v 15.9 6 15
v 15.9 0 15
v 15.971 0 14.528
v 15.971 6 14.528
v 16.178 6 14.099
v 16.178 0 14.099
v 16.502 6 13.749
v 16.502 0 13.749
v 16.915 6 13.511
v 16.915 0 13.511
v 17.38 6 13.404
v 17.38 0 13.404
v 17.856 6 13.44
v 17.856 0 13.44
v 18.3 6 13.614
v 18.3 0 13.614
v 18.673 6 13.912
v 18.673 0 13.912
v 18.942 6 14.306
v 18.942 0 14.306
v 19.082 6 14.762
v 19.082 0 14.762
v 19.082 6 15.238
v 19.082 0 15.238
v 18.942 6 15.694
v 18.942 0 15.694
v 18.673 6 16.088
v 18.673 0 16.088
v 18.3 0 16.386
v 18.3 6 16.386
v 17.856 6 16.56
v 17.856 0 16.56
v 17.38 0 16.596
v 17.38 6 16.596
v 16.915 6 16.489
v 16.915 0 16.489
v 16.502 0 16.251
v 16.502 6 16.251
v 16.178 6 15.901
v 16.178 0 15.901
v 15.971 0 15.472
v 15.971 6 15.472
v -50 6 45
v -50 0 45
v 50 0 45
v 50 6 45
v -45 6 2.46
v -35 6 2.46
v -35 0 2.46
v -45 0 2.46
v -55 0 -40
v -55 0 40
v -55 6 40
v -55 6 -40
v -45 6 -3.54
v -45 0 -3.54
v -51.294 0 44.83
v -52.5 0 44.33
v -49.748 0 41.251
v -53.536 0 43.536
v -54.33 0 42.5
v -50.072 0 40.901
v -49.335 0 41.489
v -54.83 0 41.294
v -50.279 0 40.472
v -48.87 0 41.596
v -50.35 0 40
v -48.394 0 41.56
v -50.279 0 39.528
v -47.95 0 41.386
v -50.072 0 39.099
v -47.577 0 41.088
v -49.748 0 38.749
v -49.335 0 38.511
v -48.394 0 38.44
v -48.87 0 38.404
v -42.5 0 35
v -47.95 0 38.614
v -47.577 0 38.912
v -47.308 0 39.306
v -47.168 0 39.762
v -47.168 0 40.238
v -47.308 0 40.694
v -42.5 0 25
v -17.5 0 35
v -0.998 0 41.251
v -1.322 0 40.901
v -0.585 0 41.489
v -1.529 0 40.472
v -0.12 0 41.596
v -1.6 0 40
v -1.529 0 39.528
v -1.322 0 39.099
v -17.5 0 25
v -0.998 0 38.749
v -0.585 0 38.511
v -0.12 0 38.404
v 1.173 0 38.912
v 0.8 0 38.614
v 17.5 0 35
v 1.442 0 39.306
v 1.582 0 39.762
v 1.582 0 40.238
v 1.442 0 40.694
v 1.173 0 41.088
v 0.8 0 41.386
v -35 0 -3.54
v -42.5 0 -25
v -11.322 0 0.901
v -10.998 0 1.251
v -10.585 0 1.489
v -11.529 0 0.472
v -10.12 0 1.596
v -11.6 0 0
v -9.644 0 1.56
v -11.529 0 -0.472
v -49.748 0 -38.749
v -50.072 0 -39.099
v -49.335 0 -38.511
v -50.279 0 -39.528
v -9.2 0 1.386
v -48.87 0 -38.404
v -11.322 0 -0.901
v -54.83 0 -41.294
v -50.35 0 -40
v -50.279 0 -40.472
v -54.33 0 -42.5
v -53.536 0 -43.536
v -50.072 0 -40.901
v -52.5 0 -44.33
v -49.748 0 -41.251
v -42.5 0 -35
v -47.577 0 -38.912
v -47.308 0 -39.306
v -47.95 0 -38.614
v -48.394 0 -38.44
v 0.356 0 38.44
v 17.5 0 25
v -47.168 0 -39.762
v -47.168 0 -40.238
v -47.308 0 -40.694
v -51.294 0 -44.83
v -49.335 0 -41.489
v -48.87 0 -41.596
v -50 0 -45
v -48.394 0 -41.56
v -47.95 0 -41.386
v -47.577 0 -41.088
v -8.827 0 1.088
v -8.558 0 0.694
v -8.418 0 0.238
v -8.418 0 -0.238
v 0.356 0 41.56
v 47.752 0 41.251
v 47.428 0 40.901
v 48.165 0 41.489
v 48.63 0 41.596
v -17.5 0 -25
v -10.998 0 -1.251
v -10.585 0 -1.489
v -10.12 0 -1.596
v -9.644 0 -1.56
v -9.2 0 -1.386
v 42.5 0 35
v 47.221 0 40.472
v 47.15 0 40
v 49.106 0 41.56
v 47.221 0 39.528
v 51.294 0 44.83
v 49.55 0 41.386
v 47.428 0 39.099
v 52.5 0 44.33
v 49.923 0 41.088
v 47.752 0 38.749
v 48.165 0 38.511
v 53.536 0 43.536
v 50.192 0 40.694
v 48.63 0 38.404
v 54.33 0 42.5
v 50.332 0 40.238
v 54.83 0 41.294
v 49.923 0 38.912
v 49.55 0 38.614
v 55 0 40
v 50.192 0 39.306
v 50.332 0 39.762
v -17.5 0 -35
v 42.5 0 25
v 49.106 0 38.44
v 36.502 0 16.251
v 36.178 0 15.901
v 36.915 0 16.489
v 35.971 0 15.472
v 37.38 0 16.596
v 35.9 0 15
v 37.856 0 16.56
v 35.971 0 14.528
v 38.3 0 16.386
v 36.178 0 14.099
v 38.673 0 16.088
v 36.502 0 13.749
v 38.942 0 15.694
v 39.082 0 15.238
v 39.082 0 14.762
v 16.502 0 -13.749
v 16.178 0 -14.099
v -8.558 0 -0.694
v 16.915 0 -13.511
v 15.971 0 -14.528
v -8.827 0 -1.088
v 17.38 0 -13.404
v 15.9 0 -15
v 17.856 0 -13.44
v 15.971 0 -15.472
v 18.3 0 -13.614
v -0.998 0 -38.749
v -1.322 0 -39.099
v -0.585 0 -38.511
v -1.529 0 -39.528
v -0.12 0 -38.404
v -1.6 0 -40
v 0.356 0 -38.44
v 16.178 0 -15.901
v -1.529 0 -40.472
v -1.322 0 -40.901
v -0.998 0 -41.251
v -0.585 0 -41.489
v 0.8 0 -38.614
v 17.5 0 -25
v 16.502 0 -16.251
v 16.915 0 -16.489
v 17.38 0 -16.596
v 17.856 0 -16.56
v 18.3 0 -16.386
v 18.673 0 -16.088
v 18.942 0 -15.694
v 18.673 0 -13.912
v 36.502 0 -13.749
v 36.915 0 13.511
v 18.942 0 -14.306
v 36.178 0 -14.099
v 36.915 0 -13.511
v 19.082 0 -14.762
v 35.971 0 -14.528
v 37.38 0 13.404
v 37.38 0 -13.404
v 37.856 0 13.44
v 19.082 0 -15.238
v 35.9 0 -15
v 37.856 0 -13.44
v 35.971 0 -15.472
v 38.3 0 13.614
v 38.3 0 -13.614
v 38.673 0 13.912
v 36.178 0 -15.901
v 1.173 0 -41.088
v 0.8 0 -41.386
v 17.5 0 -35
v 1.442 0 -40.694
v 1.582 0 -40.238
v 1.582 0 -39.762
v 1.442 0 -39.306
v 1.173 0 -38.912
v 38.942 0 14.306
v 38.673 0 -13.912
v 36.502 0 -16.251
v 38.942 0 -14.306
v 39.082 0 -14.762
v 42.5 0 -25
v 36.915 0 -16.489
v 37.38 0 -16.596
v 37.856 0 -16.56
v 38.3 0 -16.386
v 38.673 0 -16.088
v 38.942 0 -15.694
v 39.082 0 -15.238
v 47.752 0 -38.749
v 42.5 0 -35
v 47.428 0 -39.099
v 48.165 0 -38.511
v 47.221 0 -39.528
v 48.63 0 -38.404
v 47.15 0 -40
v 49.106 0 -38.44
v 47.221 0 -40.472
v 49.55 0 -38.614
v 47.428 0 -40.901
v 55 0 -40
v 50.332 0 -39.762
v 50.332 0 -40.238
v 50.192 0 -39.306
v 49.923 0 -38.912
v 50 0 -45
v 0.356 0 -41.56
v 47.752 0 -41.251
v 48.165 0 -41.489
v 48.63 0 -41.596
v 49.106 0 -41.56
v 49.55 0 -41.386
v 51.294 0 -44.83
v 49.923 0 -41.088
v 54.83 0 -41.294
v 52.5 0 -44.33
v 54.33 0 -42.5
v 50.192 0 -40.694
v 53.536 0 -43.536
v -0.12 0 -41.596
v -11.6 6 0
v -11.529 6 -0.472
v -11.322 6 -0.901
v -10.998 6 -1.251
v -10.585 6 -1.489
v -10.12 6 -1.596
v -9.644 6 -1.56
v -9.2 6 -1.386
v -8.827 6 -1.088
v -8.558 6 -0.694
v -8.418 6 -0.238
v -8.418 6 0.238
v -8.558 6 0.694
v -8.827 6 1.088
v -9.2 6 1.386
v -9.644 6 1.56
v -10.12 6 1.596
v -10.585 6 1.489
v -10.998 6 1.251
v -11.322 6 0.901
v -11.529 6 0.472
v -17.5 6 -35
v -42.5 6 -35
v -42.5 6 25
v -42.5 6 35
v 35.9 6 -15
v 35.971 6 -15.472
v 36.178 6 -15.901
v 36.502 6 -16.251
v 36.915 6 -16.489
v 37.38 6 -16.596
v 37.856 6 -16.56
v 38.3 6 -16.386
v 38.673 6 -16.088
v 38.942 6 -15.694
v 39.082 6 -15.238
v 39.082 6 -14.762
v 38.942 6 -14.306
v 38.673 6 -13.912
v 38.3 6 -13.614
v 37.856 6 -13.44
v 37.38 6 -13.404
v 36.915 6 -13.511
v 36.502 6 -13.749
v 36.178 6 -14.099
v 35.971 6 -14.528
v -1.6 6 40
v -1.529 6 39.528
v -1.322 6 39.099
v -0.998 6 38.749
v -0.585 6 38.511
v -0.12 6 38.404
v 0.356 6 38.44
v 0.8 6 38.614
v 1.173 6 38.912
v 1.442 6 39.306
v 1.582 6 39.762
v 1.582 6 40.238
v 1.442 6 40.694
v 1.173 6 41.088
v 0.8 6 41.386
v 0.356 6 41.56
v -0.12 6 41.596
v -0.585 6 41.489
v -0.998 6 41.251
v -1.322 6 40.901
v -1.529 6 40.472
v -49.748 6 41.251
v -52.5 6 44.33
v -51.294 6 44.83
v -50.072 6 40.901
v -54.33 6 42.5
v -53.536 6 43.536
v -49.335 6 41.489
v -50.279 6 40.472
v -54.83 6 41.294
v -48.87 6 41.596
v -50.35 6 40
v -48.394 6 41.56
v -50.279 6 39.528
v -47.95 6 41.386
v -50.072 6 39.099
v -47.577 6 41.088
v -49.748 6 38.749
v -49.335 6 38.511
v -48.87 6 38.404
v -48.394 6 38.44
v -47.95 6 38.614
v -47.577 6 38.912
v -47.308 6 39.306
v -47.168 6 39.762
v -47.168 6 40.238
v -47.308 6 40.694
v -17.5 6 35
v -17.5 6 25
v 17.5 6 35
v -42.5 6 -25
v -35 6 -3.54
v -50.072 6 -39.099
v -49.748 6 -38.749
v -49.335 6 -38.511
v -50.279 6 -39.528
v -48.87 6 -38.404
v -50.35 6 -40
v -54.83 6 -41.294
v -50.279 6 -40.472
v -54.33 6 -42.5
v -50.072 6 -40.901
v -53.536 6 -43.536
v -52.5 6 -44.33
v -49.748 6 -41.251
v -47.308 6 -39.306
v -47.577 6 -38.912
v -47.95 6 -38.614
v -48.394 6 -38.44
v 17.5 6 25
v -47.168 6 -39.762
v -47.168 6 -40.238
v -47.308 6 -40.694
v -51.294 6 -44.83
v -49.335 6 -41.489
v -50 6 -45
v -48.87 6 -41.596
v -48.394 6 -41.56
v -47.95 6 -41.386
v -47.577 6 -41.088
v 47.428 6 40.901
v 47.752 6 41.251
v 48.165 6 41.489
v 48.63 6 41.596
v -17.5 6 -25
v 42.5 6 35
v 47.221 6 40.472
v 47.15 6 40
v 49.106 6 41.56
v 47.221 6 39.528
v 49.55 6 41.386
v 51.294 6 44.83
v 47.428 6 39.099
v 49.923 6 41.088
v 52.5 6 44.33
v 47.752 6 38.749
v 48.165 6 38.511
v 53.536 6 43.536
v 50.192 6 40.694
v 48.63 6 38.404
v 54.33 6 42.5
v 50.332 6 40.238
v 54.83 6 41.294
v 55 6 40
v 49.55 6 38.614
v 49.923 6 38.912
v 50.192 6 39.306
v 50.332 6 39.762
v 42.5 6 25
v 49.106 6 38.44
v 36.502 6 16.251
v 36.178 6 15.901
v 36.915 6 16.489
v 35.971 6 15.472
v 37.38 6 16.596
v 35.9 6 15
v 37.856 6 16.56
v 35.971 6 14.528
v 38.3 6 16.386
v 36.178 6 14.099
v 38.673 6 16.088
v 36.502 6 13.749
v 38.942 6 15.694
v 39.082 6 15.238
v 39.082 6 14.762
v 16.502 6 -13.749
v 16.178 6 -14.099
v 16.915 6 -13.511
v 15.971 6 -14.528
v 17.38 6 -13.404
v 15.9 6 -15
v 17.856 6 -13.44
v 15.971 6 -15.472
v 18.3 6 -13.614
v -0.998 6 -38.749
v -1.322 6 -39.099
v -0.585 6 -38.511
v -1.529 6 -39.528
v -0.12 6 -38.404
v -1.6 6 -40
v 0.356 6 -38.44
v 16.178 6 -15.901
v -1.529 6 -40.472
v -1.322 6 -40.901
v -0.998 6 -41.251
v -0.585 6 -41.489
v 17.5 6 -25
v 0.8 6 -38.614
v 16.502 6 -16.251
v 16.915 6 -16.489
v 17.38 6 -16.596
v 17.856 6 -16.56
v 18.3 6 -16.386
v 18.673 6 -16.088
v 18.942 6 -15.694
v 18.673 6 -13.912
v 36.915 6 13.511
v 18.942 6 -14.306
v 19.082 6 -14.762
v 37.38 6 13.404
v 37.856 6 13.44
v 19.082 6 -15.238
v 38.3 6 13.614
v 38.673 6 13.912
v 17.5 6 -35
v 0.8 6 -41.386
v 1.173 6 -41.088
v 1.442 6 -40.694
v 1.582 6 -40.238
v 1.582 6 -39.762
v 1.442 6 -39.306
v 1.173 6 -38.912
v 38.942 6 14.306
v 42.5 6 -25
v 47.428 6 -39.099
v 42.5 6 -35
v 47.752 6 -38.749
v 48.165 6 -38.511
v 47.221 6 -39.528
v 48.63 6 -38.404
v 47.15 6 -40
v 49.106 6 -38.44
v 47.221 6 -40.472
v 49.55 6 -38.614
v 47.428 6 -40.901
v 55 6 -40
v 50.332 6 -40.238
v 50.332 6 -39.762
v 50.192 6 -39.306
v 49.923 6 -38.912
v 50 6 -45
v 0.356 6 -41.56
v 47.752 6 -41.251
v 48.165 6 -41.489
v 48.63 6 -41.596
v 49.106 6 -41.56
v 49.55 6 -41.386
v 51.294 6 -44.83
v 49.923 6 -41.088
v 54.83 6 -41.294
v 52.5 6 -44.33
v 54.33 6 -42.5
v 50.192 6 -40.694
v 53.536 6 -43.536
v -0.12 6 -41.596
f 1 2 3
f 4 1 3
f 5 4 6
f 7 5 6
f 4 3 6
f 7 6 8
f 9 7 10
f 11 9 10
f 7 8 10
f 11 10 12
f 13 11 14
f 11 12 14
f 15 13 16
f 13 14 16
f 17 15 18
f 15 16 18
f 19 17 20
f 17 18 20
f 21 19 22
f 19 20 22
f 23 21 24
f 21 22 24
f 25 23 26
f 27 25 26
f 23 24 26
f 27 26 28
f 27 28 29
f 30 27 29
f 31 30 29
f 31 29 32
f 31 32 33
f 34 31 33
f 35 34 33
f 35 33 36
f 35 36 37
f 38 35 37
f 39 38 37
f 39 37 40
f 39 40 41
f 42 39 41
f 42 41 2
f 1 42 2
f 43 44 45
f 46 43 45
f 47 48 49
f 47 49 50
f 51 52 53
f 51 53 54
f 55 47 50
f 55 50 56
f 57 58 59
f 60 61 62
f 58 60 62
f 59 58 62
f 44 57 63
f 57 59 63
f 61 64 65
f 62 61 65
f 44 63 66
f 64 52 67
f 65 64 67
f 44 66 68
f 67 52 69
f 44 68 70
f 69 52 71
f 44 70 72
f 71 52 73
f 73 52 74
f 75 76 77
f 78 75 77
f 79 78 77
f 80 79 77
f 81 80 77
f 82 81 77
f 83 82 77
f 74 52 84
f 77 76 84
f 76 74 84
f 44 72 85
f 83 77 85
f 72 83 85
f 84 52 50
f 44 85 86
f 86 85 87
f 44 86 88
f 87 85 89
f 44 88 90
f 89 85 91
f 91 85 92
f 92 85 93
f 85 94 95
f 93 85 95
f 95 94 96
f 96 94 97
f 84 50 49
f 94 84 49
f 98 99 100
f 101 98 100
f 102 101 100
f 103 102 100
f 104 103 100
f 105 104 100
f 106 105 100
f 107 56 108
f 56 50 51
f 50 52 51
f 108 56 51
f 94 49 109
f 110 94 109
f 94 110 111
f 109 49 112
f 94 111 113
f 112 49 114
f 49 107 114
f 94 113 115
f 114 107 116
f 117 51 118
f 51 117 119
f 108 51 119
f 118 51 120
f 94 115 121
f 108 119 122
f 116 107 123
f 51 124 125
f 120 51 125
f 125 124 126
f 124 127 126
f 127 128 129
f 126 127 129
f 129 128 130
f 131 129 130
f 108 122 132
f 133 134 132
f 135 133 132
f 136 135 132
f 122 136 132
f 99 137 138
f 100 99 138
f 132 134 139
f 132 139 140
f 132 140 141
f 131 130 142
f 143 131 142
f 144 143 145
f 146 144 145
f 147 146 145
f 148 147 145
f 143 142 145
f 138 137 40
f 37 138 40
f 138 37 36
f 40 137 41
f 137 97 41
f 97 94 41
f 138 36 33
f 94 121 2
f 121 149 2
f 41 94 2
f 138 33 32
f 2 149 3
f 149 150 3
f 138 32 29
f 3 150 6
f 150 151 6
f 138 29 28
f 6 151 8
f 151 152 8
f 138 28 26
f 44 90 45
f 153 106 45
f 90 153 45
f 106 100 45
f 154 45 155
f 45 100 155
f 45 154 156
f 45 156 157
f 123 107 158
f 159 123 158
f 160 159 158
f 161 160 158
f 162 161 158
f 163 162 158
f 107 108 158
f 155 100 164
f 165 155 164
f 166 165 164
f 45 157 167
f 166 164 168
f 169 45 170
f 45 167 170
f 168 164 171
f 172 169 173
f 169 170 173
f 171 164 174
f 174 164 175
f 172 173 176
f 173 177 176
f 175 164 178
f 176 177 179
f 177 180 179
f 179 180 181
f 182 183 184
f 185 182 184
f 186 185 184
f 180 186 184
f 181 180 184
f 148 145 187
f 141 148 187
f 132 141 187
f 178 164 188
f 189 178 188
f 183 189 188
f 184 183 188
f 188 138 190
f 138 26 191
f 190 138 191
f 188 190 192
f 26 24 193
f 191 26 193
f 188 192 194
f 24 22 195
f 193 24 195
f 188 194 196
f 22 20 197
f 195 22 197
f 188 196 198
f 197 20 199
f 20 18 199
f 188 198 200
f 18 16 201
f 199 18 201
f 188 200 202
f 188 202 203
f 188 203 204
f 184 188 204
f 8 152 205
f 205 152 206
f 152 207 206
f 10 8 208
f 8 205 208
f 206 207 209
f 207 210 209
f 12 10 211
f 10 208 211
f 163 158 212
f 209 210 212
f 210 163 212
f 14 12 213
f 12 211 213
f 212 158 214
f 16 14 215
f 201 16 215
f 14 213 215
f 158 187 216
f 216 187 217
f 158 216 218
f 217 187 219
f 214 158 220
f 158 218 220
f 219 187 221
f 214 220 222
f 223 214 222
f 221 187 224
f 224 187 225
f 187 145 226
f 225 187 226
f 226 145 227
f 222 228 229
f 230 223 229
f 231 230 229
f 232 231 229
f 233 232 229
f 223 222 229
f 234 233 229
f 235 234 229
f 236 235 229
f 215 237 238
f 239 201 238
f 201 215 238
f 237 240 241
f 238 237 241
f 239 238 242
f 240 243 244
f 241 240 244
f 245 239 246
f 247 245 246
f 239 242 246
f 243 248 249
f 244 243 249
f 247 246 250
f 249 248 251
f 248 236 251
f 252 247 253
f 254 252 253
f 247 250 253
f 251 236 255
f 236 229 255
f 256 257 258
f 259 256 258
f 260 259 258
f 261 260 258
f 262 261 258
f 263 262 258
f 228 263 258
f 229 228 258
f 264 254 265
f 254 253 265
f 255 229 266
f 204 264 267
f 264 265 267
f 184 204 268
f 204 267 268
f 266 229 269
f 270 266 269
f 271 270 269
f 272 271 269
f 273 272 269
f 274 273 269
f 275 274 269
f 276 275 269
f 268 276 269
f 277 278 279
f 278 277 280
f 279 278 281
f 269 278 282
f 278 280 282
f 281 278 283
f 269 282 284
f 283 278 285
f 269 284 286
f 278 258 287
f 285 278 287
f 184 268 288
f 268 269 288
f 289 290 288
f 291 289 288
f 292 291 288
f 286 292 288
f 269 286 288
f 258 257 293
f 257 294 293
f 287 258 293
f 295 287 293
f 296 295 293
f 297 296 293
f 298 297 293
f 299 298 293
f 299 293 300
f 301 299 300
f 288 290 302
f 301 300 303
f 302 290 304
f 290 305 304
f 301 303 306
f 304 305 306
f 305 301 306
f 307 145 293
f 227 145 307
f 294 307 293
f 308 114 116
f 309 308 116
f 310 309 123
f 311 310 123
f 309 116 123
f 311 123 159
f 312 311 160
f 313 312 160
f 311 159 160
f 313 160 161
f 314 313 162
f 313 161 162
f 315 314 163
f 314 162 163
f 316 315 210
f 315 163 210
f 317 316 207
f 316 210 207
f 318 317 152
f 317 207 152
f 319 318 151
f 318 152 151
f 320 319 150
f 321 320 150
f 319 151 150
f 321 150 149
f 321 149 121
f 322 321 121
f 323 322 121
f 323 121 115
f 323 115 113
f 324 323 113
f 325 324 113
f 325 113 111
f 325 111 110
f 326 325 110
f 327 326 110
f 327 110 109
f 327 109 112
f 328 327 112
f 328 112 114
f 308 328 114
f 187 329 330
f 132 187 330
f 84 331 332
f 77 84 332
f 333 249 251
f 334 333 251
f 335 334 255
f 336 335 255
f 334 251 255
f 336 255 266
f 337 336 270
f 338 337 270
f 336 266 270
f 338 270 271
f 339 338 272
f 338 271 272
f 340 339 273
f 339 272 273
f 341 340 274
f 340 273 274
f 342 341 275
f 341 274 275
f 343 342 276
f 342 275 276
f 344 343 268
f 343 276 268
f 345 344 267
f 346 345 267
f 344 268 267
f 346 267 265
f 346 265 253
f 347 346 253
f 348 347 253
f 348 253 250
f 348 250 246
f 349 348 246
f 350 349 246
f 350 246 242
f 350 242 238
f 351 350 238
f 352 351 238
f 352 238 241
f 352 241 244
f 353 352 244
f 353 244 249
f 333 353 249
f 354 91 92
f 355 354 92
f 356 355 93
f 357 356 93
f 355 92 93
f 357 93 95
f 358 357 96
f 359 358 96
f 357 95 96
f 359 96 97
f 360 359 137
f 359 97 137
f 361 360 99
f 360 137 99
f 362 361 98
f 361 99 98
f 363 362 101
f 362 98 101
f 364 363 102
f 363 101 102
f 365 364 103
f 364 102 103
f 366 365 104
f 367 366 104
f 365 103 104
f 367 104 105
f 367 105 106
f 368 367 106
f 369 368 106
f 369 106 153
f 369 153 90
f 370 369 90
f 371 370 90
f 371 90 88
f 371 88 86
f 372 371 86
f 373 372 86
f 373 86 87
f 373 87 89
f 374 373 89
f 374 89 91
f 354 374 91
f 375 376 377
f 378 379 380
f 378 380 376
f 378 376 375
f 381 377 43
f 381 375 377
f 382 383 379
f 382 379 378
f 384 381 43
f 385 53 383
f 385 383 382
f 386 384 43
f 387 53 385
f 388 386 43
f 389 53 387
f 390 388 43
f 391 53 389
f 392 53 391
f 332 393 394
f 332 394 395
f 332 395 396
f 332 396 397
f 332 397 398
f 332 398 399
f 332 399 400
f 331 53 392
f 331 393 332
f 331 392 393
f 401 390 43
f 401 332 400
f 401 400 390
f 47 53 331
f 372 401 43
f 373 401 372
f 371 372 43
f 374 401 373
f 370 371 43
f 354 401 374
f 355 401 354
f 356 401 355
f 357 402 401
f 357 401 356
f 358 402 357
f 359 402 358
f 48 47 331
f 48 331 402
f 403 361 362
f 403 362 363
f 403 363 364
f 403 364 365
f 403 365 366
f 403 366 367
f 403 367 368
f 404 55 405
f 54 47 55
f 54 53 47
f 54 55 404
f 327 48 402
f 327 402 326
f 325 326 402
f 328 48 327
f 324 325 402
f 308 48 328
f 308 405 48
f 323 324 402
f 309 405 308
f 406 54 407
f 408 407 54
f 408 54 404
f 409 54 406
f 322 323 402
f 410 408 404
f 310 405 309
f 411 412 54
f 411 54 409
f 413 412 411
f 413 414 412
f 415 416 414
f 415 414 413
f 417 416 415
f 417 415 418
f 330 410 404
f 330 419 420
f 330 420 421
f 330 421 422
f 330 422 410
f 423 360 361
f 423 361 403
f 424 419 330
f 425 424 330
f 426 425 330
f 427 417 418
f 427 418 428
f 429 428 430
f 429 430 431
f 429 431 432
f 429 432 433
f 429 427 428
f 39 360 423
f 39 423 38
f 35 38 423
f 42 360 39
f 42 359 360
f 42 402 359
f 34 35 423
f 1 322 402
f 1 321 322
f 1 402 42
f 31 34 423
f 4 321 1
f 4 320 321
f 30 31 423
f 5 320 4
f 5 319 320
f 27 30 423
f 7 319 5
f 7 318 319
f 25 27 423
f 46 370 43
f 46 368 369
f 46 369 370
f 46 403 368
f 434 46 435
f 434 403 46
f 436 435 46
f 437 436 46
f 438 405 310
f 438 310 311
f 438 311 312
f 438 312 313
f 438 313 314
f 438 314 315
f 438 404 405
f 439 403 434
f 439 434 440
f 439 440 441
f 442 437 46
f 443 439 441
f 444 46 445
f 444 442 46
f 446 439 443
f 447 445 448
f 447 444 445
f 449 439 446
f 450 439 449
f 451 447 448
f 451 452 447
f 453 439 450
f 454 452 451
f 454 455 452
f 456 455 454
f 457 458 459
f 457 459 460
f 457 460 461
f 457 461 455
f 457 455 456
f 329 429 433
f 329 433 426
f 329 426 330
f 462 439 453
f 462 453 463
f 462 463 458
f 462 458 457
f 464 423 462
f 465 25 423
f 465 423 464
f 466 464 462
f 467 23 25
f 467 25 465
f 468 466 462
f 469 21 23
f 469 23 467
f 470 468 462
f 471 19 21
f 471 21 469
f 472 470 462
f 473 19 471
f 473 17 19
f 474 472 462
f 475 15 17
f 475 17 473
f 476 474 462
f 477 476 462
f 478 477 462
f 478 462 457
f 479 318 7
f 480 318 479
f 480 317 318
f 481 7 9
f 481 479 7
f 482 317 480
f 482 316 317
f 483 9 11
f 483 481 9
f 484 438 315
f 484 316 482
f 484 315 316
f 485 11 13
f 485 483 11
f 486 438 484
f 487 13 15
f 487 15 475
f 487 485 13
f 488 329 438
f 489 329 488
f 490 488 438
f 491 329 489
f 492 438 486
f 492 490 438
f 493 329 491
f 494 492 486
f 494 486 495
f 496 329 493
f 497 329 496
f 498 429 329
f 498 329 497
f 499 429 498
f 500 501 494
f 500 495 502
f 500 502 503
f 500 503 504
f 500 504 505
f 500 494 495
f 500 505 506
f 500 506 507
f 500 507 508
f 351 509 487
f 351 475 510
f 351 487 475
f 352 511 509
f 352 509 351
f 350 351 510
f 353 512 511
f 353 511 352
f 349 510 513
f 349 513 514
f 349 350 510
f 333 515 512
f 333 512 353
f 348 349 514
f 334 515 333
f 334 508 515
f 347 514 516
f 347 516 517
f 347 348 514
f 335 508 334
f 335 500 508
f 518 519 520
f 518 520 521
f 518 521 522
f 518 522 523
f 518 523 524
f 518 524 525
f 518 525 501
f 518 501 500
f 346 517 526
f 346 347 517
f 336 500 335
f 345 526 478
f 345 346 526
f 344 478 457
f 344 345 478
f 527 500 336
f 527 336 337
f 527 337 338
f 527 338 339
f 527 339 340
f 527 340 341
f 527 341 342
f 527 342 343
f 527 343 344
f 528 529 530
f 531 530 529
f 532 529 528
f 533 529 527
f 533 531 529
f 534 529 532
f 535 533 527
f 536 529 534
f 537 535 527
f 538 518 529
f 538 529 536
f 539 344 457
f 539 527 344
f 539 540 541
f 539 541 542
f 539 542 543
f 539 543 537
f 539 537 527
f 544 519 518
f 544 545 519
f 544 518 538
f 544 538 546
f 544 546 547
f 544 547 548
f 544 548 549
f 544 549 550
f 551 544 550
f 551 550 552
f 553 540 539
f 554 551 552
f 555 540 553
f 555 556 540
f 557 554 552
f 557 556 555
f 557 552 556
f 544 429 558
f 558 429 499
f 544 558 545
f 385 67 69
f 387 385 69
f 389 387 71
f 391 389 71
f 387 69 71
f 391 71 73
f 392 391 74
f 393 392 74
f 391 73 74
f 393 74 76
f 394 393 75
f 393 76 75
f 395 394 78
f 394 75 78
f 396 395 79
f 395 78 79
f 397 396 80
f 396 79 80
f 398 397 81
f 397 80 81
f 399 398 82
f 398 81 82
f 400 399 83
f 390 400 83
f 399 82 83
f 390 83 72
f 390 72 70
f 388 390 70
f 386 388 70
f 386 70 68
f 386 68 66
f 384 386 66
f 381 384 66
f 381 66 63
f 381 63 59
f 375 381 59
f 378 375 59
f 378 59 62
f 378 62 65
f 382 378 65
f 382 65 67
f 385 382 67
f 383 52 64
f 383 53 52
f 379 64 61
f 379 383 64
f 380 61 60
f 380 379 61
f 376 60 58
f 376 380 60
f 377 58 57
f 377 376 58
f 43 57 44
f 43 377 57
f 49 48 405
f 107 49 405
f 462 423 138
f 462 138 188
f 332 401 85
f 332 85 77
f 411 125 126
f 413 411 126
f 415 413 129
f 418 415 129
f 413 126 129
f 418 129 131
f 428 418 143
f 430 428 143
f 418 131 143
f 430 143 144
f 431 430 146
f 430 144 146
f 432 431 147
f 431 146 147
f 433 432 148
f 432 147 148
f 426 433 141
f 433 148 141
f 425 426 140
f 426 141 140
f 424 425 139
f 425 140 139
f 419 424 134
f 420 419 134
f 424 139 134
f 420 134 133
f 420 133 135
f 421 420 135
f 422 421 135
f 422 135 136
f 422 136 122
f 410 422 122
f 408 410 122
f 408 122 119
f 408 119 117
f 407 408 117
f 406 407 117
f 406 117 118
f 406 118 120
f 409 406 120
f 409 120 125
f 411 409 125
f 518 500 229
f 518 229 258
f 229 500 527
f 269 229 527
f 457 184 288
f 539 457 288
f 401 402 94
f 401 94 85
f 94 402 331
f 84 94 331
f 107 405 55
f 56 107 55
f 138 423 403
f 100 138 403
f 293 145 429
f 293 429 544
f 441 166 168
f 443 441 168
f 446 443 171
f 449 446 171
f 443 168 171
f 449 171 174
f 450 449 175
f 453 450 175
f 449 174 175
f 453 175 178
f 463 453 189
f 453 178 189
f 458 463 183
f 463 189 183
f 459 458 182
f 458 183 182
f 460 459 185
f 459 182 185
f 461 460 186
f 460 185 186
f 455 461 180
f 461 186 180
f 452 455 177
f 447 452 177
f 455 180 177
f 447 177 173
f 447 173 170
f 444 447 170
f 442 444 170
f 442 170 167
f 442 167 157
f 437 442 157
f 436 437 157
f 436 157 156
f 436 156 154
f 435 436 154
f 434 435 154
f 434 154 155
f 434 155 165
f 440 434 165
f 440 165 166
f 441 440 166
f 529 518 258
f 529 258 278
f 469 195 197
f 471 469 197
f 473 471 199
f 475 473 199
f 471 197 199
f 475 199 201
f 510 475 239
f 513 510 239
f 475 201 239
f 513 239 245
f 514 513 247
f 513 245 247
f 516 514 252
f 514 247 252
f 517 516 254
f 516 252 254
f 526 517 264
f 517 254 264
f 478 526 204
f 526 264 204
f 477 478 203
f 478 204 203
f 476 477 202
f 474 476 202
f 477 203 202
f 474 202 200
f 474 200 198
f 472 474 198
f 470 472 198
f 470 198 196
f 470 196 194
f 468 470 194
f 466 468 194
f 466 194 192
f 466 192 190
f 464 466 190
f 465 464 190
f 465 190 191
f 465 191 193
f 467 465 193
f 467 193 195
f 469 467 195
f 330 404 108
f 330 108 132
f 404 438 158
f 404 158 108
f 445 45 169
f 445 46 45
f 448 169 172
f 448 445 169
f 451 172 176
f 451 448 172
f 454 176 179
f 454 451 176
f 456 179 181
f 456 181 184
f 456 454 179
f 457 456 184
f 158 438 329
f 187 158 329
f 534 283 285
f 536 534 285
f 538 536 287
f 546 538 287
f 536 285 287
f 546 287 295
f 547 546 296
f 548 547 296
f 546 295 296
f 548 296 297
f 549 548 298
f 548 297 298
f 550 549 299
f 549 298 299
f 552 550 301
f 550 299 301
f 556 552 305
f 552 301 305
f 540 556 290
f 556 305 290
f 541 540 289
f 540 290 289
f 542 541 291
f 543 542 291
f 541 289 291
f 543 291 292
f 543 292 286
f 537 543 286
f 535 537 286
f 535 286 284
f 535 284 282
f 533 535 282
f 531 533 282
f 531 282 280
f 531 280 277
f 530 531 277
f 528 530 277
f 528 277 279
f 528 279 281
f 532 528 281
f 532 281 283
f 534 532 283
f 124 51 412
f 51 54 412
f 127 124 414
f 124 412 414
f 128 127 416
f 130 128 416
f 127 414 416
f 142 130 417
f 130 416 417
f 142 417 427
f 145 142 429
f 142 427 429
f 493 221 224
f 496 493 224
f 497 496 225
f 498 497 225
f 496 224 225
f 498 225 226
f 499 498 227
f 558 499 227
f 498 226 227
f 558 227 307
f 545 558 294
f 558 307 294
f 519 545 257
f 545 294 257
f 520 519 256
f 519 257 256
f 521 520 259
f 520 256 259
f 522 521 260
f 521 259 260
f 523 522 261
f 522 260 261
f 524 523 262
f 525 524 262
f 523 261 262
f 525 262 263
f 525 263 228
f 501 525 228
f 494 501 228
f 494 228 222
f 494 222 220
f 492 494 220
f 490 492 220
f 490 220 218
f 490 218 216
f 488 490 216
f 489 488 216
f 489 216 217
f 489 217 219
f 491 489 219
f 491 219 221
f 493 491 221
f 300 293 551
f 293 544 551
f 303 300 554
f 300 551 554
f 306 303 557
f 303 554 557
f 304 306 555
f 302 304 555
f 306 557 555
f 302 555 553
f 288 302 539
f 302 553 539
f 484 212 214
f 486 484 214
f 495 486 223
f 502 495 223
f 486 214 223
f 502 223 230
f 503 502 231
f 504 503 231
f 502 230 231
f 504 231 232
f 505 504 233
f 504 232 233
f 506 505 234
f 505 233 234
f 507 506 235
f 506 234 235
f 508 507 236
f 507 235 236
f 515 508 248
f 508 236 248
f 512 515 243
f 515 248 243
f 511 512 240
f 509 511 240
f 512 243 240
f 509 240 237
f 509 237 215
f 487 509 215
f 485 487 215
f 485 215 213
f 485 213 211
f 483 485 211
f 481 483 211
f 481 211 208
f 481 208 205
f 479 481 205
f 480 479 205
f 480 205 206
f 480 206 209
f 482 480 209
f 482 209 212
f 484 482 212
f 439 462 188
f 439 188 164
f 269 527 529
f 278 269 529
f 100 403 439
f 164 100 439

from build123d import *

# Parameters (mm, degrees)
SKETCH1_W                = 110
SKETCH1_H                = 90
BOSS_EXTRUDE1_DEPTH      = 6
SKETCH2_W                = 25
SKETCH2_H                = 10
CUT_EXTRUDE1_DEPTH       = 7
MIRROR2_COPY_1_SKETCH_W  = 25
MIRROR2_COPY_1_SKETCH_H  = 10
MIRROR2_COPY_1_DEPTH     = 7
M3_CLEARANCE_HOLE1_D     = 3.2
M3_CLEARANCE_HOLE2_D     = 3.2
FILLET1_R                = 5
SKETCH62_W               = 10
SKETCH62_H               = 6
CUT_EXTRUDE12_DEPTH      = 4
CUT_EXTRUDE12_DEPTH_BACK = 4


with BuildPart() as part:
    # Sketch1 → Boss-Extrude1 (new body)
    with BuildSketch(Plane(origin=(0, 0, 0), x_dir=(1, 0, 0), z_dir=(0, 1, 0))):
        Rectangle(SKETCH1_W, SKETCH1_H)
    extrude(amount=BOSS_EXTRUDE1_DEPTH)

    # Sketch2 → Cut-Extrude1 (cut, through all)
    with BuildSketch(Plane(origin=(0, 6, 0), x_dir=(1, 0, 0), z_dir=(0, 1, 0))):
        with Locations((30, 30)):
            Rectangle(SKETCH2_W, SKETCH2_H)
    cut_extrude1 = extrude(amount=-CUT_EXTRUDE1_DEPTH, mode=Mode.SUBTRACT)

    # Mirror1: Cut-Extrude1 across plane
    add(cut_extrude1.mirror(Plane.XY), mode=Mode.SUBTRACT)

    # Mirror2: Cut-Extrude1 across plane
    add(cut_extrude1.mirror(Plane(origin=(0, 0, 0), x_dir=(0, 0, 1), z_dir=(1, 0, 0))), mode=Mode.SUBTRACT)

    # Mirror2 copy 1 sketch → Mirror2 copy 1 (cut, through all)
    with BuildSketch(Plane(origin=(0, 6, 0), x_dir=(-1, 0, 0), z_dir=(0, 1, 0))):
        with Locations((30, 30)):
            Rectangle(MIRROR2_COPY_1_SKETCH_W, MIRROR2_COPY_1_SKETCH_H)
    extrude(amount=-MIRROR2_COPY_1_DEPTH, mode=Mode.SUBTRACT)

    # M3 Clearance Hole1 (through all)
    with Locations(Plane(origin=(0, 6, 0), x_dir=(1, 0, 0), z_dir=(0, 1, 0))):
        with Locations((17.5, 15), (37.5, 15), (17.5, -15), (37.5, -15)):
            Hole(M3_CLEARANCE_HOLE1_D / 2)

    # M3 Clearance Hole2 (through all)
    with Locations(Plane(origin=(0, 6, 0), x_dir=(1, 0, 0), z_dir=(0, 1, 0))):
        with Locations((48.75, 40), (0, 40), (-48.75, 40), (-48.75, -40), (0, -40), (48.75, -40), (-10, 0)):
            Hole(M3_CLEARANCE_HOLE2_D / 2)

    # Fillet1
    fillet1_edges = [part.edges().sort_by_distance(p)[0] for p in [
        (55, 3, 45),
        (-55, 3, 45),
        (-55, 3, -45),
        (55, 3, -45),
    ]]
    fillet(fillet1_edges, radius=FILLET1_R)

    # Sketch62 → Cut-Extrude12 (cut, two sides)
    with BuildSketch(Plane(origin=(-39.232221392, 3, -44.54), x_dir=(-1, 0, 0), z_dir=(0, -1, 0))) as cut_extrude12_sk:
        with Locations((0.767778608, -44)):
            Rectangle(SKETCH62_W, SKETCH62_H)
    extrude(amount=CUT_EXTRUDE12_DEPTH, mode=Mode.SUBTRACT)
    extrude(cut_extrude12_sk.sketch, amount=-CUT_EXTRUDE12_DEPTH_BACK, mode=Mode.SUBTRACT)


solid = part.part
